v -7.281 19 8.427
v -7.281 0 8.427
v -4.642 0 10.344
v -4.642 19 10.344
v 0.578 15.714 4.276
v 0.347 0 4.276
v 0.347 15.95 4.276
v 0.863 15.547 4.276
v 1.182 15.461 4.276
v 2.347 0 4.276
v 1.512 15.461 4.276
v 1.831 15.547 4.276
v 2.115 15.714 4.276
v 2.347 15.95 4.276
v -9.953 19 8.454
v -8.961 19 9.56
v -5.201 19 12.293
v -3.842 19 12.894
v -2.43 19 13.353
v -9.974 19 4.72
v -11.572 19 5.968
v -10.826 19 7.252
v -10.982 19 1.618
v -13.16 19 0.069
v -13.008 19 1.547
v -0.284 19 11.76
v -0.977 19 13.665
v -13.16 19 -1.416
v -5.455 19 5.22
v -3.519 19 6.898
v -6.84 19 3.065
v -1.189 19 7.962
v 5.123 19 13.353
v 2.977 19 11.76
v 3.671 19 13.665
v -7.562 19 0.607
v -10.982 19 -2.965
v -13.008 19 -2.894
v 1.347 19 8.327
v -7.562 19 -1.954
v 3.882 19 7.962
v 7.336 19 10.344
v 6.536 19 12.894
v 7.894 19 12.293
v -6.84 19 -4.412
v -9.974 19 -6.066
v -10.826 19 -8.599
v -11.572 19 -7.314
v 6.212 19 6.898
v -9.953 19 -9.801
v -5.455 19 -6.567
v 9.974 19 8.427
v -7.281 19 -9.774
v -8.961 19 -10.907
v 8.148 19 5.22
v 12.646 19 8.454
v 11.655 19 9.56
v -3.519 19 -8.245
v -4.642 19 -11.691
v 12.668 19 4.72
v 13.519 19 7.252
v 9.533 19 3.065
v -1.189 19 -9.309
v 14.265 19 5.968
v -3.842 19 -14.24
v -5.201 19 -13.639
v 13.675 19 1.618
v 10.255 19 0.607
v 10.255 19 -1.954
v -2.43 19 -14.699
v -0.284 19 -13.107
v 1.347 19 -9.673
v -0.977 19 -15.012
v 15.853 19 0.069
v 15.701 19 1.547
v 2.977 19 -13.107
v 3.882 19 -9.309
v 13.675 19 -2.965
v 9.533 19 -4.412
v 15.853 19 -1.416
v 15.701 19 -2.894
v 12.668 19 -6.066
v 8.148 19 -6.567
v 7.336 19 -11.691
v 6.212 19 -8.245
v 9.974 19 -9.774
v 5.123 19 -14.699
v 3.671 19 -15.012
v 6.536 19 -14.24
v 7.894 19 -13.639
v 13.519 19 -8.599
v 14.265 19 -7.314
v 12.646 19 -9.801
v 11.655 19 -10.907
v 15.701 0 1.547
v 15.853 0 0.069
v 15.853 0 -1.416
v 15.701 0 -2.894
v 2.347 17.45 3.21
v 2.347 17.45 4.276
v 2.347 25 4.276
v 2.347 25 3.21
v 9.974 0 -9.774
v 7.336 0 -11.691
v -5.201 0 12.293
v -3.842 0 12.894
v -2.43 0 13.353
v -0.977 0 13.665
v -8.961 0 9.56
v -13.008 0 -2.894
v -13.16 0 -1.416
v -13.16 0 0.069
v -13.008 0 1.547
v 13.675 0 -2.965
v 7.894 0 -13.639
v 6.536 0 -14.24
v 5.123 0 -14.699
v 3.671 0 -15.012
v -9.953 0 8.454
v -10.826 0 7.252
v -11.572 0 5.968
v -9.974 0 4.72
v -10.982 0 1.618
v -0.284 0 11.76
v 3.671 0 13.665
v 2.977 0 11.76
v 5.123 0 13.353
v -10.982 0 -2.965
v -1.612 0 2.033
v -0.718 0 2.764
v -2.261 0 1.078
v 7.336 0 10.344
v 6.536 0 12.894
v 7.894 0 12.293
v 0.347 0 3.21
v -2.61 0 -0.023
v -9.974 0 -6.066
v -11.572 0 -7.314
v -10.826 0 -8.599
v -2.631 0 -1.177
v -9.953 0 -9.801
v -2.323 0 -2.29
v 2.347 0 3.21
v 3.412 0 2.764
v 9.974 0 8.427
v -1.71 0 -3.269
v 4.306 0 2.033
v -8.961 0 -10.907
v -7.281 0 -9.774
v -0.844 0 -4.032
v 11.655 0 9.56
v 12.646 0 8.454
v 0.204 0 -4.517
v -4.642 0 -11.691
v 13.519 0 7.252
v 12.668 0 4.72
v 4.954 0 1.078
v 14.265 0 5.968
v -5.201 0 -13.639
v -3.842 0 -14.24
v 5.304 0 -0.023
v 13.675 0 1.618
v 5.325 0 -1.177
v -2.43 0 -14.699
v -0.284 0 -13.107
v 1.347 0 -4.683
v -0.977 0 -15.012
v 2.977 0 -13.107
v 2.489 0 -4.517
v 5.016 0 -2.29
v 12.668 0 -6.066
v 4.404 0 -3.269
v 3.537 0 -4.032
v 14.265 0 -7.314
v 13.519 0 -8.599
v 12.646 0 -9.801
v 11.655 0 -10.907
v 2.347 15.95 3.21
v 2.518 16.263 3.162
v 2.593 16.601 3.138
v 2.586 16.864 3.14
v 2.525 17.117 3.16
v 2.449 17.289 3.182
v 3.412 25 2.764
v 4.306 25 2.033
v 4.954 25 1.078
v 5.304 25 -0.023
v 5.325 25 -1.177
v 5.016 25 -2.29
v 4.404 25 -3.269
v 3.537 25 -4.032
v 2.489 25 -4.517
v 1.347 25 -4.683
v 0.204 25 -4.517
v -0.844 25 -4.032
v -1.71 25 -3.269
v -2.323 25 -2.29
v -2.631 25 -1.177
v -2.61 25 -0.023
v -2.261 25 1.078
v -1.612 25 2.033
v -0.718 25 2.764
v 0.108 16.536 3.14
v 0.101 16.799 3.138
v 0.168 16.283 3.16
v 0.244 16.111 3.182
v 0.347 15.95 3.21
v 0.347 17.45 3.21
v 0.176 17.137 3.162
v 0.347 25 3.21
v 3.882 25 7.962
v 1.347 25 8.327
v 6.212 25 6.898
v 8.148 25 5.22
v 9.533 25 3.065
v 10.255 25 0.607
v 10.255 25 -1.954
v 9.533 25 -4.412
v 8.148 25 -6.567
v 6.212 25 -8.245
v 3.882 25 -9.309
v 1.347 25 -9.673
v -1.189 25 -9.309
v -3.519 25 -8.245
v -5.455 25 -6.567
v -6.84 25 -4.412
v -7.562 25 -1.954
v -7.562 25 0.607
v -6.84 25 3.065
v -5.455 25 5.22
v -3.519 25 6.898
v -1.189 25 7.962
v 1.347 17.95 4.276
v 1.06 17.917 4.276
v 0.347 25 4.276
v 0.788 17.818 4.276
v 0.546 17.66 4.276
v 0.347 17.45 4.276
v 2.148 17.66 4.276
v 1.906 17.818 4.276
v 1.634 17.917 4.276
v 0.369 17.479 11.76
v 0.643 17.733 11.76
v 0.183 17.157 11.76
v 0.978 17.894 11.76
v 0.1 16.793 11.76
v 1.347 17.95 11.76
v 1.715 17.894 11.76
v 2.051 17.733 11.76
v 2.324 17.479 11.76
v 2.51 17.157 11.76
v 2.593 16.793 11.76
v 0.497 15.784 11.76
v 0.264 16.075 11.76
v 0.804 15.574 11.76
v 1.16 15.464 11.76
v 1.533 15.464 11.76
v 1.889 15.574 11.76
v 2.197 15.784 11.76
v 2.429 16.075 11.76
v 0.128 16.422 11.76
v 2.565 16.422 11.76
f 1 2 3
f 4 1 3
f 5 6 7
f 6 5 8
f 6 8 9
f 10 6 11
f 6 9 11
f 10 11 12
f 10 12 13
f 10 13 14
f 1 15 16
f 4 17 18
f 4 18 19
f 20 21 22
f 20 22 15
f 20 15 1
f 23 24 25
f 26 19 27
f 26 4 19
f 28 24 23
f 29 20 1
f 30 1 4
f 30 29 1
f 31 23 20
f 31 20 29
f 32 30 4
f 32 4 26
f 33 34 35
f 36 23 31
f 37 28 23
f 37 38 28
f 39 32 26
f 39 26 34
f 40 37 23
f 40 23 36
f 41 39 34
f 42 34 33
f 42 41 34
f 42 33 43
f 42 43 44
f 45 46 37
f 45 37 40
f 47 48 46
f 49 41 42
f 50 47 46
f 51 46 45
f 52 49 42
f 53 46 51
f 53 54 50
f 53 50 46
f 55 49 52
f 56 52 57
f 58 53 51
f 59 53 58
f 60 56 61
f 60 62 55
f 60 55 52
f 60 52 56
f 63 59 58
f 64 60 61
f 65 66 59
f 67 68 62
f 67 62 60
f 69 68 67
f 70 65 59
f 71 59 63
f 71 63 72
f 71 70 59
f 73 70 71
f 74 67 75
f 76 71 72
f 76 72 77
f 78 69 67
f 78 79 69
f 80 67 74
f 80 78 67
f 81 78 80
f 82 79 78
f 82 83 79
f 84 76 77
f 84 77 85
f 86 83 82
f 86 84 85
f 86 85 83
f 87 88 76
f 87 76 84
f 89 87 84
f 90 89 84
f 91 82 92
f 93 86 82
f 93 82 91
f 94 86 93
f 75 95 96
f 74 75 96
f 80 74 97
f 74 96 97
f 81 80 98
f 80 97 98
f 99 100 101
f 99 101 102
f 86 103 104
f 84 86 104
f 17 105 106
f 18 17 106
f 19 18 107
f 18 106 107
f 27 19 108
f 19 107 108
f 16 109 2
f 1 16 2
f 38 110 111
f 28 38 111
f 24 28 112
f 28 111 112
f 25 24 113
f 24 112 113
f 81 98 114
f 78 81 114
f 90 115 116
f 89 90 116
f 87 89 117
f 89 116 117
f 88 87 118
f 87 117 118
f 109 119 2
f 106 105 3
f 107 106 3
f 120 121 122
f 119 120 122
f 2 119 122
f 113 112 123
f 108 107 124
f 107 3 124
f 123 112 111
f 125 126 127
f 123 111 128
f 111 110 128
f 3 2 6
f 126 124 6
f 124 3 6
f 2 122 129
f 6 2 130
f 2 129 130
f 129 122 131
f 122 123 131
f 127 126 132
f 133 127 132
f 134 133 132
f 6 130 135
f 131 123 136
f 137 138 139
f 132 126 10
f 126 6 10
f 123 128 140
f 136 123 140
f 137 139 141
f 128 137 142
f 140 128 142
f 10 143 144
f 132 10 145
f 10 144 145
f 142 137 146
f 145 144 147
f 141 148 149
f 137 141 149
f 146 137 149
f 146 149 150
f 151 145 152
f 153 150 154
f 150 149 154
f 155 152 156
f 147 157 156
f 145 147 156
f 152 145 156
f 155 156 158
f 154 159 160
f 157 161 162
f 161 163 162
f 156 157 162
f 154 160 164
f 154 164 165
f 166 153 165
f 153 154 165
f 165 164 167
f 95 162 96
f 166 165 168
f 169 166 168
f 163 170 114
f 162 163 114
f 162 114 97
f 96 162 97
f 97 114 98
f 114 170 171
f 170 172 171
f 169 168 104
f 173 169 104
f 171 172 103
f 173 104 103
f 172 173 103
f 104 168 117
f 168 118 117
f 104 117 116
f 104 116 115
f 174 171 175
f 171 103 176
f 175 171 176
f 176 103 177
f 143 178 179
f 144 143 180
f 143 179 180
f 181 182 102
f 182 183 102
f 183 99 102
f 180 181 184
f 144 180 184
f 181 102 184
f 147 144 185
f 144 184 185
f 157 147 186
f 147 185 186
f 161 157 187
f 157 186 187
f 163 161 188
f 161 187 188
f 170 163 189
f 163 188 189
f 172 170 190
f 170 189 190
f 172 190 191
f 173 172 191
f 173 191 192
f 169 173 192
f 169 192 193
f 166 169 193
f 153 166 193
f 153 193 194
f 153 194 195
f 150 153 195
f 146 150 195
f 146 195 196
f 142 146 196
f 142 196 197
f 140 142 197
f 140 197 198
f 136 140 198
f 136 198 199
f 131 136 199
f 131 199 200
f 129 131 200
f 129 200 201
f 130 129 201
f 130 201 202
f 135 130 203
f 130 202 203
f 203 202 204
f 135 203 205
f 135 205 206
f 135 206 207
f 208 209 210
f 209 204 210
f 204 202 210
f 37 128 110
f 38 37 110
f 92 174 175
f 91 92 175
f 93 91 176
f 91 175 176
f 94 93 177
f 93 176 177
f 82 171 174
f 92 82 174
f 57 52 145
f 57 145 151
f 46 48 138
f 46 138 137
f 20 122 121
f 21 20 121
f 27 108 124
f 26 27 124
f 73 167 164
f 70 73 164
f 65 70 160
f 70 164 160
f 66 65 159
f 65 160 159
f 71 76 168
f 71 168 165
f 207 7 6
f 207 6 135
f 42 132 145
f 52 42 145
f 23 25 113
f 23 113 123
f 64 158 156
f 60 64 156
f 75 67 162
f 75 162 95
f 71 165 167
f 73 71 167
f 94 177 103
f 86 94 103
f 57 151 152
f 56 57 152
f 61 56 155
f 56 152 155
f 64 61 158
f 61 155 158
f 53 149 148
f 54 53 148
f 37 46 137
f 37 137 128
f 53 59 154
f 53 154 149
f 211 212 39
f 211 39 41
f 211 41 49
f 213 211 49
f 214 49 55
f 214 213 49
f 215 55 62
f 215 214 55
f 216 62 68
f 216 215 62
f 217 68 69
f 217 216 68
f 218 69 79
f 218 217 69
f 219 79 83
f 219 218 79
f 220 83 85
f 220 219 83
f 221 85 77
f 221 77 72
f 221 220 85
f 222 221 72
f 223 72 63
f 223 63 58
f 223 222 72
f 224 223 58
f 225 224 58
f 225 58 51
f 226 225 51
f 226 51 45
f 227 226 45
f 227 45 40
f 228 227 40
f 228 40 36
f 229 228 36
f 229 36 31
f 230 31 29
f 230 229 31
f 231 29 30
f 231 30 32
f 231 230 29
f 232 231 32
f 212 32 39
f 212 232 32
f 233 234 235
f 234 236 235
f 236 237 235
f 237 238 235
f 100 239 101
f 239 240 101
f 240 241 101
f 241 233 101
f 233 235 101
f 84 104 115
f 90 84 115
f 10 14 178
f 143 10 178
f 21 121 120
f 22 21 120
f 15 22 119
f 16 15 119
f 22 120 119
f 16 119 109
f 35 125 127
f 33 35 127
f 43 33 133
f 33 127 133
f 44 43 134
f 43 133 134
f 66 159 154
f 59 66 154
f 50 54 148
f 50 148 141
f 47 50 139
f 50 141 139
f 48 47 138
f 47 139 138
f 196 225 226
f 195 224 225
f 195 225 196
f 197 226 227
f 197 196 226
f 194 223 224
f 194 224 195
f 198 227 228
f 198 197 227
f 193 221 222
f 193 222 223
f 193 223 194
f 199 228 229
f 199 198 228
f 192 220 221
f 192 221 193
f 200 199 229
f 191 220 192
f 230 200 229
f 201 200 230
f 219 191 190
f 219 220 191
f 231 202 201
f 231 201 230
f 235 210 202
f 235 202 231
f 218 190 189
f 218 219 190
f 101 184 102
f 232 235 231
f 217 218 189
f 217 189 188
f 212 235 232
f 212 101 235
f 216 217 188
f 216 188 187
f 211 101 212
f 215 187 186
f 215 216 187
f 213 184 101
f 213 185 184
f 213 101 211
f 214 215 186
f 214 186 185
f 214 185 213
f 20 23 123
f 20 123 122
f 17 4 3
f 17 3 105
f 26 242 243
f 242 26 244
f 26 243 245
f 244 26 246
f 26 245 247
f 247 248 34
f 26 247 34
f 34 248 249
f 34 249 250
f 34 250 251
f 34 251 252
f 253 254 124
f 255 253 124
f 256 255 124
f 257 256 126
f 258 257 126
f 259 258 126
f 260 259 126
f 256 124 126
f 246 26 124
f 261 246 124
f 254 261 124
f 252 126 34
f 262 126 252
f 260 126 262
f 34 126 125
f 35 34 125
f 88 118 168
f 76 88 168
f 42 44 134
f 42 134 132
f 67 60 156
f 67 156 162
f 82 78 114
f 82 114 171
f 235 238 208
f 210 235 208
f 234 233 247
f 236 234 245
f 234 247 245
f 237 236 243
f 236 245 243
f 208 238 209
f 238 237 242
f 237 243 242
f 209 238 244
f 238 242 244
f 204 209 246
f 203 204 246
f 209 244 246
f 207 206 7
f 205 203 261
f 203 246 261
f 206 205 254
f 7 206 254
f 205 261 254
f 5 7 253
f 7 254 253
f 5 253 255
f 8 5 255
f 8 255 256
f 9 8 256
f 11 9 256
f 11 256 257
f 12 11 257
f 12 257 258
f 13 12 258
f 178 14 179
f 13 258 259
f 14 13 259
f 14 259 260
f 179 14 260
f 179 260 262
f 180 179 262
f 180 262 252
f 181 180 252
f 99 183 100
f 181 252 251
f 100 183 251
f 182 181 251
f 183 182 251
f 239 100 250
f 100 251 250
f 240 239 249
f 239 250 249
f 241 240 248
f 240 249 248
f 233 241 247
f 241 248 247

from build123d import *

# Parameters (mm, degrees)
BOSS_EXTRUDE1_DEPTH = 19
SKETCH3_R           = 4.01
CUT_EXTRUDE1_DEPTH  = 29.952983186
BOSS_EXTRUDE2_START = 6
SKETCH5_R           = 9
SKETCH5_R_2         = 4.01
BOSS_EXTRUDE2_DEPTH = 6
SKETCH6_W           = 2
SKETCH6_H           = 3.816021538
CUT_EXTRUDE3_DEPTH  = 34.200530649
SKETCH10_W          = 1.25
SKETCH10_H          = 12.389397068


with BuildPart() as part:
    # Sketch2 → Boss-Extrude1 (new body)
    with BuildSketch(Plane(origin=(0, 0, 0), x_dir=(1, 0, 0), z_dir=(0, 1, 0))):
        with BuildLine():
            Line((7.335535963, -10.343914335), (9.974123377, -8.426868365))
            Line((9.974123377, -8.426868365), (11.654796972, -9.560497019))
            ThreePointArc((11.654796972, -9.560497019), (13.098043776, -7.864477351), (14.265066544, -5.967769174))
            Line((14.265066544, -5.967769174), (12.667564922, -4.719664118))
            Line((12.667564922, -4.719664118), (13.675415632, -1.617818581))
            Line((13.675415632, -1.617818581), (15.701439337, -1.547068275))
            ThreePointArc((15.701439337, -1.547068275), (15.87215518, 0.673359646), (15.701439337, 2.893787567))
            Line((15.701439337, 2.893787567), (13.675415632, 2.964537874))
            Line((13.675415632, 2.964537874), (12.667564922, 6.066383411))
            Line((12.667564922, 6.066383411), (14.265066544, 7.314488466))
            ThreePointArc((14.265066544, 7.314488466), (13.098043776, 9.211196644), (11.654796972, 10.907216312))
            Line((11.654796972, 10.907216312), (9.974123377, 9.773587658))
            Line((9.974123377, 9.773587658), (7.335535963, 11.690633627))
            Line((7.335535963, 11.690633627), (7.894324179, 13.639359722))
            ThreePointArc((7.894324179, 13.639359722), (5.835325832, 14.487870099), (3.670819293, 15.011659646))
            Line((3.670819293, 15.011659646), (2.977455996, 13.106659646))
            Line((2.977455996, 13.106659646), (-0.284017411, 13.106659646))
            Line((-0.284017411, 13.106659646), (-0.977380707, 15.011659646))
            ThreePointArc((-0.977380707, 15.011659646), (-3.141887247, 14.487870099), (-5.200885594, 13.639359722))
            Line((-5.200885594, 13.639359722), (-4.642097378, 11.690633627))
            Line((-4.642097378, 11.690633627), (-7.280684791, 9.773587658))
            Line((-7.280684791, 9.773587658), (-8.961358387, 10.907216312))
            ThreePointArc((-8.961358387, 10.907216312), (-10.40460519, 9.211196644), (-11.571627958, 7.314488466))
            Line((-11.571627958, 7.314488466), (-9.974126336, 6.066383411))
            Line((-9.974126336, 6.066383411), (-10.981977046, 2.964537874))
            Line((-10.981977046, 2.964537874), (-13.008000751, 2.893787567))
            ThreePointArc((-13.008000751, 2.893787567), (-13.178716594, 0.673359646), (-13.008000751, -1.547068275))
            Line((-13.008000751, -1.547068275), (-10.981977046, -1.617818581))
            Line((-10.981977046, -1.617818581), (-9.974126336, -4.719664118))
            Line((-9.974126336, -4.719664118), (-11.571627958, -5.967769174))
            ThreePointArc((-11.571627958, -5.967769174), (-10.40460519, -7.864477351), (-8.961358387, -9.560497019))
            Line((-8.961358387, -9.560497019), (-7.280684791, -8.426868365))
            Line((-7.280684791, -8.426868365), (-4.642097378, -10.343914335))
            Line((-4.642097378, -10.343914335), (-5.200885594, -12.292640429))
            ThreePointArc((-5.200885594, -12.292640429), (-3.141887247, -13.141150806), (-0.977380707, -13.664940354))
            Line((-0.977380707, -13.664940354), (-0.284017411, -11.759940354))
            Line((-0.284017411, -11.759940354), (2.977455996, -11.759940354))
            Line((2.977455996, -11.759940354), (3.670819293, -13.664940354))
            ThreePointArc((3.670819293, -13.664940354), (5.835325832, -13.141150806), (7.894324179, -12.292640429))
            Line((7.894324179, -12.292640429), (7.335535963, -10.343914335))
        make_face()
    extrude(amount=BOSS_EXTRUDE1_DEPTH)

    # Sketch3 → Cut-Extrude1 (cut, through all)
    with BuildSketch(Plane(origin=(0, 19, 0), x_dir=(1, 0, 0), z_dir=(0, 1, 0))):
        with Locations(Location((1.346719293, 0.673359646, 0), (0, 0, 270))):
            Circle(SKETCH3_R)
    extrude(amount=-CUT_EXTRUDE1_DEPTH, mode=Mode.SUBTRACT)

    # Sketch5 → Boss-Extrude2 (add)
    with BuildSketch(Plane(origin=(0, 19, 0), x_dir=(1, 0, 0), z_dir=(0, 1, 0)).offset(BOSS_EXTRUDE2_START)):
        with Locations(Location((1.346719293, 0.673359646, 0), (0, 0, 270))):
            Circle(SKETCH5_R)
        with Locations(Location((1.346719293, 0.673359646, 0), (0, 0, 270))):
            Circle(SKETCH5_R_2, mode=Mode.SUBTRACT)
    extrude(amount=-BOSS_EXTRUDE2_DEPTH)

    # Sketch6 → Cut-Extrude3 (cut, through all)
    with BuildSketch(Plane(origin=(0, 25, 0), x_dir=(1, 0, 0), z_dir=(0, 1, 0))):
        with Locations((1.346719293, -2.367532517)):
            Rectangle(SKETCH6_W, SKETCH6_H)
    extrude(amount=-CUT_EXTRUDE3_DEPTH, mode=Mode.SUBTRACT)

    # Sketch10 → M3x0.5 Tapped Hole2 (revolve, cut)
    with BuildSketch(Plane(origin=(1.346719293, 16.7, 1.275543286), x_dir=(0, 1, 0), z_dir=(1, 0, 0))):
        with Locations((0.625, 6.194698534)):
            Rectangle(SKETCH10_W, SKETCH10_H)
    revolve(axis=Axis((1.346719293, 16.7, -5.074456714), (0, 0, 1)), mode=Mode.SUBTRACT)


solid = part.part
